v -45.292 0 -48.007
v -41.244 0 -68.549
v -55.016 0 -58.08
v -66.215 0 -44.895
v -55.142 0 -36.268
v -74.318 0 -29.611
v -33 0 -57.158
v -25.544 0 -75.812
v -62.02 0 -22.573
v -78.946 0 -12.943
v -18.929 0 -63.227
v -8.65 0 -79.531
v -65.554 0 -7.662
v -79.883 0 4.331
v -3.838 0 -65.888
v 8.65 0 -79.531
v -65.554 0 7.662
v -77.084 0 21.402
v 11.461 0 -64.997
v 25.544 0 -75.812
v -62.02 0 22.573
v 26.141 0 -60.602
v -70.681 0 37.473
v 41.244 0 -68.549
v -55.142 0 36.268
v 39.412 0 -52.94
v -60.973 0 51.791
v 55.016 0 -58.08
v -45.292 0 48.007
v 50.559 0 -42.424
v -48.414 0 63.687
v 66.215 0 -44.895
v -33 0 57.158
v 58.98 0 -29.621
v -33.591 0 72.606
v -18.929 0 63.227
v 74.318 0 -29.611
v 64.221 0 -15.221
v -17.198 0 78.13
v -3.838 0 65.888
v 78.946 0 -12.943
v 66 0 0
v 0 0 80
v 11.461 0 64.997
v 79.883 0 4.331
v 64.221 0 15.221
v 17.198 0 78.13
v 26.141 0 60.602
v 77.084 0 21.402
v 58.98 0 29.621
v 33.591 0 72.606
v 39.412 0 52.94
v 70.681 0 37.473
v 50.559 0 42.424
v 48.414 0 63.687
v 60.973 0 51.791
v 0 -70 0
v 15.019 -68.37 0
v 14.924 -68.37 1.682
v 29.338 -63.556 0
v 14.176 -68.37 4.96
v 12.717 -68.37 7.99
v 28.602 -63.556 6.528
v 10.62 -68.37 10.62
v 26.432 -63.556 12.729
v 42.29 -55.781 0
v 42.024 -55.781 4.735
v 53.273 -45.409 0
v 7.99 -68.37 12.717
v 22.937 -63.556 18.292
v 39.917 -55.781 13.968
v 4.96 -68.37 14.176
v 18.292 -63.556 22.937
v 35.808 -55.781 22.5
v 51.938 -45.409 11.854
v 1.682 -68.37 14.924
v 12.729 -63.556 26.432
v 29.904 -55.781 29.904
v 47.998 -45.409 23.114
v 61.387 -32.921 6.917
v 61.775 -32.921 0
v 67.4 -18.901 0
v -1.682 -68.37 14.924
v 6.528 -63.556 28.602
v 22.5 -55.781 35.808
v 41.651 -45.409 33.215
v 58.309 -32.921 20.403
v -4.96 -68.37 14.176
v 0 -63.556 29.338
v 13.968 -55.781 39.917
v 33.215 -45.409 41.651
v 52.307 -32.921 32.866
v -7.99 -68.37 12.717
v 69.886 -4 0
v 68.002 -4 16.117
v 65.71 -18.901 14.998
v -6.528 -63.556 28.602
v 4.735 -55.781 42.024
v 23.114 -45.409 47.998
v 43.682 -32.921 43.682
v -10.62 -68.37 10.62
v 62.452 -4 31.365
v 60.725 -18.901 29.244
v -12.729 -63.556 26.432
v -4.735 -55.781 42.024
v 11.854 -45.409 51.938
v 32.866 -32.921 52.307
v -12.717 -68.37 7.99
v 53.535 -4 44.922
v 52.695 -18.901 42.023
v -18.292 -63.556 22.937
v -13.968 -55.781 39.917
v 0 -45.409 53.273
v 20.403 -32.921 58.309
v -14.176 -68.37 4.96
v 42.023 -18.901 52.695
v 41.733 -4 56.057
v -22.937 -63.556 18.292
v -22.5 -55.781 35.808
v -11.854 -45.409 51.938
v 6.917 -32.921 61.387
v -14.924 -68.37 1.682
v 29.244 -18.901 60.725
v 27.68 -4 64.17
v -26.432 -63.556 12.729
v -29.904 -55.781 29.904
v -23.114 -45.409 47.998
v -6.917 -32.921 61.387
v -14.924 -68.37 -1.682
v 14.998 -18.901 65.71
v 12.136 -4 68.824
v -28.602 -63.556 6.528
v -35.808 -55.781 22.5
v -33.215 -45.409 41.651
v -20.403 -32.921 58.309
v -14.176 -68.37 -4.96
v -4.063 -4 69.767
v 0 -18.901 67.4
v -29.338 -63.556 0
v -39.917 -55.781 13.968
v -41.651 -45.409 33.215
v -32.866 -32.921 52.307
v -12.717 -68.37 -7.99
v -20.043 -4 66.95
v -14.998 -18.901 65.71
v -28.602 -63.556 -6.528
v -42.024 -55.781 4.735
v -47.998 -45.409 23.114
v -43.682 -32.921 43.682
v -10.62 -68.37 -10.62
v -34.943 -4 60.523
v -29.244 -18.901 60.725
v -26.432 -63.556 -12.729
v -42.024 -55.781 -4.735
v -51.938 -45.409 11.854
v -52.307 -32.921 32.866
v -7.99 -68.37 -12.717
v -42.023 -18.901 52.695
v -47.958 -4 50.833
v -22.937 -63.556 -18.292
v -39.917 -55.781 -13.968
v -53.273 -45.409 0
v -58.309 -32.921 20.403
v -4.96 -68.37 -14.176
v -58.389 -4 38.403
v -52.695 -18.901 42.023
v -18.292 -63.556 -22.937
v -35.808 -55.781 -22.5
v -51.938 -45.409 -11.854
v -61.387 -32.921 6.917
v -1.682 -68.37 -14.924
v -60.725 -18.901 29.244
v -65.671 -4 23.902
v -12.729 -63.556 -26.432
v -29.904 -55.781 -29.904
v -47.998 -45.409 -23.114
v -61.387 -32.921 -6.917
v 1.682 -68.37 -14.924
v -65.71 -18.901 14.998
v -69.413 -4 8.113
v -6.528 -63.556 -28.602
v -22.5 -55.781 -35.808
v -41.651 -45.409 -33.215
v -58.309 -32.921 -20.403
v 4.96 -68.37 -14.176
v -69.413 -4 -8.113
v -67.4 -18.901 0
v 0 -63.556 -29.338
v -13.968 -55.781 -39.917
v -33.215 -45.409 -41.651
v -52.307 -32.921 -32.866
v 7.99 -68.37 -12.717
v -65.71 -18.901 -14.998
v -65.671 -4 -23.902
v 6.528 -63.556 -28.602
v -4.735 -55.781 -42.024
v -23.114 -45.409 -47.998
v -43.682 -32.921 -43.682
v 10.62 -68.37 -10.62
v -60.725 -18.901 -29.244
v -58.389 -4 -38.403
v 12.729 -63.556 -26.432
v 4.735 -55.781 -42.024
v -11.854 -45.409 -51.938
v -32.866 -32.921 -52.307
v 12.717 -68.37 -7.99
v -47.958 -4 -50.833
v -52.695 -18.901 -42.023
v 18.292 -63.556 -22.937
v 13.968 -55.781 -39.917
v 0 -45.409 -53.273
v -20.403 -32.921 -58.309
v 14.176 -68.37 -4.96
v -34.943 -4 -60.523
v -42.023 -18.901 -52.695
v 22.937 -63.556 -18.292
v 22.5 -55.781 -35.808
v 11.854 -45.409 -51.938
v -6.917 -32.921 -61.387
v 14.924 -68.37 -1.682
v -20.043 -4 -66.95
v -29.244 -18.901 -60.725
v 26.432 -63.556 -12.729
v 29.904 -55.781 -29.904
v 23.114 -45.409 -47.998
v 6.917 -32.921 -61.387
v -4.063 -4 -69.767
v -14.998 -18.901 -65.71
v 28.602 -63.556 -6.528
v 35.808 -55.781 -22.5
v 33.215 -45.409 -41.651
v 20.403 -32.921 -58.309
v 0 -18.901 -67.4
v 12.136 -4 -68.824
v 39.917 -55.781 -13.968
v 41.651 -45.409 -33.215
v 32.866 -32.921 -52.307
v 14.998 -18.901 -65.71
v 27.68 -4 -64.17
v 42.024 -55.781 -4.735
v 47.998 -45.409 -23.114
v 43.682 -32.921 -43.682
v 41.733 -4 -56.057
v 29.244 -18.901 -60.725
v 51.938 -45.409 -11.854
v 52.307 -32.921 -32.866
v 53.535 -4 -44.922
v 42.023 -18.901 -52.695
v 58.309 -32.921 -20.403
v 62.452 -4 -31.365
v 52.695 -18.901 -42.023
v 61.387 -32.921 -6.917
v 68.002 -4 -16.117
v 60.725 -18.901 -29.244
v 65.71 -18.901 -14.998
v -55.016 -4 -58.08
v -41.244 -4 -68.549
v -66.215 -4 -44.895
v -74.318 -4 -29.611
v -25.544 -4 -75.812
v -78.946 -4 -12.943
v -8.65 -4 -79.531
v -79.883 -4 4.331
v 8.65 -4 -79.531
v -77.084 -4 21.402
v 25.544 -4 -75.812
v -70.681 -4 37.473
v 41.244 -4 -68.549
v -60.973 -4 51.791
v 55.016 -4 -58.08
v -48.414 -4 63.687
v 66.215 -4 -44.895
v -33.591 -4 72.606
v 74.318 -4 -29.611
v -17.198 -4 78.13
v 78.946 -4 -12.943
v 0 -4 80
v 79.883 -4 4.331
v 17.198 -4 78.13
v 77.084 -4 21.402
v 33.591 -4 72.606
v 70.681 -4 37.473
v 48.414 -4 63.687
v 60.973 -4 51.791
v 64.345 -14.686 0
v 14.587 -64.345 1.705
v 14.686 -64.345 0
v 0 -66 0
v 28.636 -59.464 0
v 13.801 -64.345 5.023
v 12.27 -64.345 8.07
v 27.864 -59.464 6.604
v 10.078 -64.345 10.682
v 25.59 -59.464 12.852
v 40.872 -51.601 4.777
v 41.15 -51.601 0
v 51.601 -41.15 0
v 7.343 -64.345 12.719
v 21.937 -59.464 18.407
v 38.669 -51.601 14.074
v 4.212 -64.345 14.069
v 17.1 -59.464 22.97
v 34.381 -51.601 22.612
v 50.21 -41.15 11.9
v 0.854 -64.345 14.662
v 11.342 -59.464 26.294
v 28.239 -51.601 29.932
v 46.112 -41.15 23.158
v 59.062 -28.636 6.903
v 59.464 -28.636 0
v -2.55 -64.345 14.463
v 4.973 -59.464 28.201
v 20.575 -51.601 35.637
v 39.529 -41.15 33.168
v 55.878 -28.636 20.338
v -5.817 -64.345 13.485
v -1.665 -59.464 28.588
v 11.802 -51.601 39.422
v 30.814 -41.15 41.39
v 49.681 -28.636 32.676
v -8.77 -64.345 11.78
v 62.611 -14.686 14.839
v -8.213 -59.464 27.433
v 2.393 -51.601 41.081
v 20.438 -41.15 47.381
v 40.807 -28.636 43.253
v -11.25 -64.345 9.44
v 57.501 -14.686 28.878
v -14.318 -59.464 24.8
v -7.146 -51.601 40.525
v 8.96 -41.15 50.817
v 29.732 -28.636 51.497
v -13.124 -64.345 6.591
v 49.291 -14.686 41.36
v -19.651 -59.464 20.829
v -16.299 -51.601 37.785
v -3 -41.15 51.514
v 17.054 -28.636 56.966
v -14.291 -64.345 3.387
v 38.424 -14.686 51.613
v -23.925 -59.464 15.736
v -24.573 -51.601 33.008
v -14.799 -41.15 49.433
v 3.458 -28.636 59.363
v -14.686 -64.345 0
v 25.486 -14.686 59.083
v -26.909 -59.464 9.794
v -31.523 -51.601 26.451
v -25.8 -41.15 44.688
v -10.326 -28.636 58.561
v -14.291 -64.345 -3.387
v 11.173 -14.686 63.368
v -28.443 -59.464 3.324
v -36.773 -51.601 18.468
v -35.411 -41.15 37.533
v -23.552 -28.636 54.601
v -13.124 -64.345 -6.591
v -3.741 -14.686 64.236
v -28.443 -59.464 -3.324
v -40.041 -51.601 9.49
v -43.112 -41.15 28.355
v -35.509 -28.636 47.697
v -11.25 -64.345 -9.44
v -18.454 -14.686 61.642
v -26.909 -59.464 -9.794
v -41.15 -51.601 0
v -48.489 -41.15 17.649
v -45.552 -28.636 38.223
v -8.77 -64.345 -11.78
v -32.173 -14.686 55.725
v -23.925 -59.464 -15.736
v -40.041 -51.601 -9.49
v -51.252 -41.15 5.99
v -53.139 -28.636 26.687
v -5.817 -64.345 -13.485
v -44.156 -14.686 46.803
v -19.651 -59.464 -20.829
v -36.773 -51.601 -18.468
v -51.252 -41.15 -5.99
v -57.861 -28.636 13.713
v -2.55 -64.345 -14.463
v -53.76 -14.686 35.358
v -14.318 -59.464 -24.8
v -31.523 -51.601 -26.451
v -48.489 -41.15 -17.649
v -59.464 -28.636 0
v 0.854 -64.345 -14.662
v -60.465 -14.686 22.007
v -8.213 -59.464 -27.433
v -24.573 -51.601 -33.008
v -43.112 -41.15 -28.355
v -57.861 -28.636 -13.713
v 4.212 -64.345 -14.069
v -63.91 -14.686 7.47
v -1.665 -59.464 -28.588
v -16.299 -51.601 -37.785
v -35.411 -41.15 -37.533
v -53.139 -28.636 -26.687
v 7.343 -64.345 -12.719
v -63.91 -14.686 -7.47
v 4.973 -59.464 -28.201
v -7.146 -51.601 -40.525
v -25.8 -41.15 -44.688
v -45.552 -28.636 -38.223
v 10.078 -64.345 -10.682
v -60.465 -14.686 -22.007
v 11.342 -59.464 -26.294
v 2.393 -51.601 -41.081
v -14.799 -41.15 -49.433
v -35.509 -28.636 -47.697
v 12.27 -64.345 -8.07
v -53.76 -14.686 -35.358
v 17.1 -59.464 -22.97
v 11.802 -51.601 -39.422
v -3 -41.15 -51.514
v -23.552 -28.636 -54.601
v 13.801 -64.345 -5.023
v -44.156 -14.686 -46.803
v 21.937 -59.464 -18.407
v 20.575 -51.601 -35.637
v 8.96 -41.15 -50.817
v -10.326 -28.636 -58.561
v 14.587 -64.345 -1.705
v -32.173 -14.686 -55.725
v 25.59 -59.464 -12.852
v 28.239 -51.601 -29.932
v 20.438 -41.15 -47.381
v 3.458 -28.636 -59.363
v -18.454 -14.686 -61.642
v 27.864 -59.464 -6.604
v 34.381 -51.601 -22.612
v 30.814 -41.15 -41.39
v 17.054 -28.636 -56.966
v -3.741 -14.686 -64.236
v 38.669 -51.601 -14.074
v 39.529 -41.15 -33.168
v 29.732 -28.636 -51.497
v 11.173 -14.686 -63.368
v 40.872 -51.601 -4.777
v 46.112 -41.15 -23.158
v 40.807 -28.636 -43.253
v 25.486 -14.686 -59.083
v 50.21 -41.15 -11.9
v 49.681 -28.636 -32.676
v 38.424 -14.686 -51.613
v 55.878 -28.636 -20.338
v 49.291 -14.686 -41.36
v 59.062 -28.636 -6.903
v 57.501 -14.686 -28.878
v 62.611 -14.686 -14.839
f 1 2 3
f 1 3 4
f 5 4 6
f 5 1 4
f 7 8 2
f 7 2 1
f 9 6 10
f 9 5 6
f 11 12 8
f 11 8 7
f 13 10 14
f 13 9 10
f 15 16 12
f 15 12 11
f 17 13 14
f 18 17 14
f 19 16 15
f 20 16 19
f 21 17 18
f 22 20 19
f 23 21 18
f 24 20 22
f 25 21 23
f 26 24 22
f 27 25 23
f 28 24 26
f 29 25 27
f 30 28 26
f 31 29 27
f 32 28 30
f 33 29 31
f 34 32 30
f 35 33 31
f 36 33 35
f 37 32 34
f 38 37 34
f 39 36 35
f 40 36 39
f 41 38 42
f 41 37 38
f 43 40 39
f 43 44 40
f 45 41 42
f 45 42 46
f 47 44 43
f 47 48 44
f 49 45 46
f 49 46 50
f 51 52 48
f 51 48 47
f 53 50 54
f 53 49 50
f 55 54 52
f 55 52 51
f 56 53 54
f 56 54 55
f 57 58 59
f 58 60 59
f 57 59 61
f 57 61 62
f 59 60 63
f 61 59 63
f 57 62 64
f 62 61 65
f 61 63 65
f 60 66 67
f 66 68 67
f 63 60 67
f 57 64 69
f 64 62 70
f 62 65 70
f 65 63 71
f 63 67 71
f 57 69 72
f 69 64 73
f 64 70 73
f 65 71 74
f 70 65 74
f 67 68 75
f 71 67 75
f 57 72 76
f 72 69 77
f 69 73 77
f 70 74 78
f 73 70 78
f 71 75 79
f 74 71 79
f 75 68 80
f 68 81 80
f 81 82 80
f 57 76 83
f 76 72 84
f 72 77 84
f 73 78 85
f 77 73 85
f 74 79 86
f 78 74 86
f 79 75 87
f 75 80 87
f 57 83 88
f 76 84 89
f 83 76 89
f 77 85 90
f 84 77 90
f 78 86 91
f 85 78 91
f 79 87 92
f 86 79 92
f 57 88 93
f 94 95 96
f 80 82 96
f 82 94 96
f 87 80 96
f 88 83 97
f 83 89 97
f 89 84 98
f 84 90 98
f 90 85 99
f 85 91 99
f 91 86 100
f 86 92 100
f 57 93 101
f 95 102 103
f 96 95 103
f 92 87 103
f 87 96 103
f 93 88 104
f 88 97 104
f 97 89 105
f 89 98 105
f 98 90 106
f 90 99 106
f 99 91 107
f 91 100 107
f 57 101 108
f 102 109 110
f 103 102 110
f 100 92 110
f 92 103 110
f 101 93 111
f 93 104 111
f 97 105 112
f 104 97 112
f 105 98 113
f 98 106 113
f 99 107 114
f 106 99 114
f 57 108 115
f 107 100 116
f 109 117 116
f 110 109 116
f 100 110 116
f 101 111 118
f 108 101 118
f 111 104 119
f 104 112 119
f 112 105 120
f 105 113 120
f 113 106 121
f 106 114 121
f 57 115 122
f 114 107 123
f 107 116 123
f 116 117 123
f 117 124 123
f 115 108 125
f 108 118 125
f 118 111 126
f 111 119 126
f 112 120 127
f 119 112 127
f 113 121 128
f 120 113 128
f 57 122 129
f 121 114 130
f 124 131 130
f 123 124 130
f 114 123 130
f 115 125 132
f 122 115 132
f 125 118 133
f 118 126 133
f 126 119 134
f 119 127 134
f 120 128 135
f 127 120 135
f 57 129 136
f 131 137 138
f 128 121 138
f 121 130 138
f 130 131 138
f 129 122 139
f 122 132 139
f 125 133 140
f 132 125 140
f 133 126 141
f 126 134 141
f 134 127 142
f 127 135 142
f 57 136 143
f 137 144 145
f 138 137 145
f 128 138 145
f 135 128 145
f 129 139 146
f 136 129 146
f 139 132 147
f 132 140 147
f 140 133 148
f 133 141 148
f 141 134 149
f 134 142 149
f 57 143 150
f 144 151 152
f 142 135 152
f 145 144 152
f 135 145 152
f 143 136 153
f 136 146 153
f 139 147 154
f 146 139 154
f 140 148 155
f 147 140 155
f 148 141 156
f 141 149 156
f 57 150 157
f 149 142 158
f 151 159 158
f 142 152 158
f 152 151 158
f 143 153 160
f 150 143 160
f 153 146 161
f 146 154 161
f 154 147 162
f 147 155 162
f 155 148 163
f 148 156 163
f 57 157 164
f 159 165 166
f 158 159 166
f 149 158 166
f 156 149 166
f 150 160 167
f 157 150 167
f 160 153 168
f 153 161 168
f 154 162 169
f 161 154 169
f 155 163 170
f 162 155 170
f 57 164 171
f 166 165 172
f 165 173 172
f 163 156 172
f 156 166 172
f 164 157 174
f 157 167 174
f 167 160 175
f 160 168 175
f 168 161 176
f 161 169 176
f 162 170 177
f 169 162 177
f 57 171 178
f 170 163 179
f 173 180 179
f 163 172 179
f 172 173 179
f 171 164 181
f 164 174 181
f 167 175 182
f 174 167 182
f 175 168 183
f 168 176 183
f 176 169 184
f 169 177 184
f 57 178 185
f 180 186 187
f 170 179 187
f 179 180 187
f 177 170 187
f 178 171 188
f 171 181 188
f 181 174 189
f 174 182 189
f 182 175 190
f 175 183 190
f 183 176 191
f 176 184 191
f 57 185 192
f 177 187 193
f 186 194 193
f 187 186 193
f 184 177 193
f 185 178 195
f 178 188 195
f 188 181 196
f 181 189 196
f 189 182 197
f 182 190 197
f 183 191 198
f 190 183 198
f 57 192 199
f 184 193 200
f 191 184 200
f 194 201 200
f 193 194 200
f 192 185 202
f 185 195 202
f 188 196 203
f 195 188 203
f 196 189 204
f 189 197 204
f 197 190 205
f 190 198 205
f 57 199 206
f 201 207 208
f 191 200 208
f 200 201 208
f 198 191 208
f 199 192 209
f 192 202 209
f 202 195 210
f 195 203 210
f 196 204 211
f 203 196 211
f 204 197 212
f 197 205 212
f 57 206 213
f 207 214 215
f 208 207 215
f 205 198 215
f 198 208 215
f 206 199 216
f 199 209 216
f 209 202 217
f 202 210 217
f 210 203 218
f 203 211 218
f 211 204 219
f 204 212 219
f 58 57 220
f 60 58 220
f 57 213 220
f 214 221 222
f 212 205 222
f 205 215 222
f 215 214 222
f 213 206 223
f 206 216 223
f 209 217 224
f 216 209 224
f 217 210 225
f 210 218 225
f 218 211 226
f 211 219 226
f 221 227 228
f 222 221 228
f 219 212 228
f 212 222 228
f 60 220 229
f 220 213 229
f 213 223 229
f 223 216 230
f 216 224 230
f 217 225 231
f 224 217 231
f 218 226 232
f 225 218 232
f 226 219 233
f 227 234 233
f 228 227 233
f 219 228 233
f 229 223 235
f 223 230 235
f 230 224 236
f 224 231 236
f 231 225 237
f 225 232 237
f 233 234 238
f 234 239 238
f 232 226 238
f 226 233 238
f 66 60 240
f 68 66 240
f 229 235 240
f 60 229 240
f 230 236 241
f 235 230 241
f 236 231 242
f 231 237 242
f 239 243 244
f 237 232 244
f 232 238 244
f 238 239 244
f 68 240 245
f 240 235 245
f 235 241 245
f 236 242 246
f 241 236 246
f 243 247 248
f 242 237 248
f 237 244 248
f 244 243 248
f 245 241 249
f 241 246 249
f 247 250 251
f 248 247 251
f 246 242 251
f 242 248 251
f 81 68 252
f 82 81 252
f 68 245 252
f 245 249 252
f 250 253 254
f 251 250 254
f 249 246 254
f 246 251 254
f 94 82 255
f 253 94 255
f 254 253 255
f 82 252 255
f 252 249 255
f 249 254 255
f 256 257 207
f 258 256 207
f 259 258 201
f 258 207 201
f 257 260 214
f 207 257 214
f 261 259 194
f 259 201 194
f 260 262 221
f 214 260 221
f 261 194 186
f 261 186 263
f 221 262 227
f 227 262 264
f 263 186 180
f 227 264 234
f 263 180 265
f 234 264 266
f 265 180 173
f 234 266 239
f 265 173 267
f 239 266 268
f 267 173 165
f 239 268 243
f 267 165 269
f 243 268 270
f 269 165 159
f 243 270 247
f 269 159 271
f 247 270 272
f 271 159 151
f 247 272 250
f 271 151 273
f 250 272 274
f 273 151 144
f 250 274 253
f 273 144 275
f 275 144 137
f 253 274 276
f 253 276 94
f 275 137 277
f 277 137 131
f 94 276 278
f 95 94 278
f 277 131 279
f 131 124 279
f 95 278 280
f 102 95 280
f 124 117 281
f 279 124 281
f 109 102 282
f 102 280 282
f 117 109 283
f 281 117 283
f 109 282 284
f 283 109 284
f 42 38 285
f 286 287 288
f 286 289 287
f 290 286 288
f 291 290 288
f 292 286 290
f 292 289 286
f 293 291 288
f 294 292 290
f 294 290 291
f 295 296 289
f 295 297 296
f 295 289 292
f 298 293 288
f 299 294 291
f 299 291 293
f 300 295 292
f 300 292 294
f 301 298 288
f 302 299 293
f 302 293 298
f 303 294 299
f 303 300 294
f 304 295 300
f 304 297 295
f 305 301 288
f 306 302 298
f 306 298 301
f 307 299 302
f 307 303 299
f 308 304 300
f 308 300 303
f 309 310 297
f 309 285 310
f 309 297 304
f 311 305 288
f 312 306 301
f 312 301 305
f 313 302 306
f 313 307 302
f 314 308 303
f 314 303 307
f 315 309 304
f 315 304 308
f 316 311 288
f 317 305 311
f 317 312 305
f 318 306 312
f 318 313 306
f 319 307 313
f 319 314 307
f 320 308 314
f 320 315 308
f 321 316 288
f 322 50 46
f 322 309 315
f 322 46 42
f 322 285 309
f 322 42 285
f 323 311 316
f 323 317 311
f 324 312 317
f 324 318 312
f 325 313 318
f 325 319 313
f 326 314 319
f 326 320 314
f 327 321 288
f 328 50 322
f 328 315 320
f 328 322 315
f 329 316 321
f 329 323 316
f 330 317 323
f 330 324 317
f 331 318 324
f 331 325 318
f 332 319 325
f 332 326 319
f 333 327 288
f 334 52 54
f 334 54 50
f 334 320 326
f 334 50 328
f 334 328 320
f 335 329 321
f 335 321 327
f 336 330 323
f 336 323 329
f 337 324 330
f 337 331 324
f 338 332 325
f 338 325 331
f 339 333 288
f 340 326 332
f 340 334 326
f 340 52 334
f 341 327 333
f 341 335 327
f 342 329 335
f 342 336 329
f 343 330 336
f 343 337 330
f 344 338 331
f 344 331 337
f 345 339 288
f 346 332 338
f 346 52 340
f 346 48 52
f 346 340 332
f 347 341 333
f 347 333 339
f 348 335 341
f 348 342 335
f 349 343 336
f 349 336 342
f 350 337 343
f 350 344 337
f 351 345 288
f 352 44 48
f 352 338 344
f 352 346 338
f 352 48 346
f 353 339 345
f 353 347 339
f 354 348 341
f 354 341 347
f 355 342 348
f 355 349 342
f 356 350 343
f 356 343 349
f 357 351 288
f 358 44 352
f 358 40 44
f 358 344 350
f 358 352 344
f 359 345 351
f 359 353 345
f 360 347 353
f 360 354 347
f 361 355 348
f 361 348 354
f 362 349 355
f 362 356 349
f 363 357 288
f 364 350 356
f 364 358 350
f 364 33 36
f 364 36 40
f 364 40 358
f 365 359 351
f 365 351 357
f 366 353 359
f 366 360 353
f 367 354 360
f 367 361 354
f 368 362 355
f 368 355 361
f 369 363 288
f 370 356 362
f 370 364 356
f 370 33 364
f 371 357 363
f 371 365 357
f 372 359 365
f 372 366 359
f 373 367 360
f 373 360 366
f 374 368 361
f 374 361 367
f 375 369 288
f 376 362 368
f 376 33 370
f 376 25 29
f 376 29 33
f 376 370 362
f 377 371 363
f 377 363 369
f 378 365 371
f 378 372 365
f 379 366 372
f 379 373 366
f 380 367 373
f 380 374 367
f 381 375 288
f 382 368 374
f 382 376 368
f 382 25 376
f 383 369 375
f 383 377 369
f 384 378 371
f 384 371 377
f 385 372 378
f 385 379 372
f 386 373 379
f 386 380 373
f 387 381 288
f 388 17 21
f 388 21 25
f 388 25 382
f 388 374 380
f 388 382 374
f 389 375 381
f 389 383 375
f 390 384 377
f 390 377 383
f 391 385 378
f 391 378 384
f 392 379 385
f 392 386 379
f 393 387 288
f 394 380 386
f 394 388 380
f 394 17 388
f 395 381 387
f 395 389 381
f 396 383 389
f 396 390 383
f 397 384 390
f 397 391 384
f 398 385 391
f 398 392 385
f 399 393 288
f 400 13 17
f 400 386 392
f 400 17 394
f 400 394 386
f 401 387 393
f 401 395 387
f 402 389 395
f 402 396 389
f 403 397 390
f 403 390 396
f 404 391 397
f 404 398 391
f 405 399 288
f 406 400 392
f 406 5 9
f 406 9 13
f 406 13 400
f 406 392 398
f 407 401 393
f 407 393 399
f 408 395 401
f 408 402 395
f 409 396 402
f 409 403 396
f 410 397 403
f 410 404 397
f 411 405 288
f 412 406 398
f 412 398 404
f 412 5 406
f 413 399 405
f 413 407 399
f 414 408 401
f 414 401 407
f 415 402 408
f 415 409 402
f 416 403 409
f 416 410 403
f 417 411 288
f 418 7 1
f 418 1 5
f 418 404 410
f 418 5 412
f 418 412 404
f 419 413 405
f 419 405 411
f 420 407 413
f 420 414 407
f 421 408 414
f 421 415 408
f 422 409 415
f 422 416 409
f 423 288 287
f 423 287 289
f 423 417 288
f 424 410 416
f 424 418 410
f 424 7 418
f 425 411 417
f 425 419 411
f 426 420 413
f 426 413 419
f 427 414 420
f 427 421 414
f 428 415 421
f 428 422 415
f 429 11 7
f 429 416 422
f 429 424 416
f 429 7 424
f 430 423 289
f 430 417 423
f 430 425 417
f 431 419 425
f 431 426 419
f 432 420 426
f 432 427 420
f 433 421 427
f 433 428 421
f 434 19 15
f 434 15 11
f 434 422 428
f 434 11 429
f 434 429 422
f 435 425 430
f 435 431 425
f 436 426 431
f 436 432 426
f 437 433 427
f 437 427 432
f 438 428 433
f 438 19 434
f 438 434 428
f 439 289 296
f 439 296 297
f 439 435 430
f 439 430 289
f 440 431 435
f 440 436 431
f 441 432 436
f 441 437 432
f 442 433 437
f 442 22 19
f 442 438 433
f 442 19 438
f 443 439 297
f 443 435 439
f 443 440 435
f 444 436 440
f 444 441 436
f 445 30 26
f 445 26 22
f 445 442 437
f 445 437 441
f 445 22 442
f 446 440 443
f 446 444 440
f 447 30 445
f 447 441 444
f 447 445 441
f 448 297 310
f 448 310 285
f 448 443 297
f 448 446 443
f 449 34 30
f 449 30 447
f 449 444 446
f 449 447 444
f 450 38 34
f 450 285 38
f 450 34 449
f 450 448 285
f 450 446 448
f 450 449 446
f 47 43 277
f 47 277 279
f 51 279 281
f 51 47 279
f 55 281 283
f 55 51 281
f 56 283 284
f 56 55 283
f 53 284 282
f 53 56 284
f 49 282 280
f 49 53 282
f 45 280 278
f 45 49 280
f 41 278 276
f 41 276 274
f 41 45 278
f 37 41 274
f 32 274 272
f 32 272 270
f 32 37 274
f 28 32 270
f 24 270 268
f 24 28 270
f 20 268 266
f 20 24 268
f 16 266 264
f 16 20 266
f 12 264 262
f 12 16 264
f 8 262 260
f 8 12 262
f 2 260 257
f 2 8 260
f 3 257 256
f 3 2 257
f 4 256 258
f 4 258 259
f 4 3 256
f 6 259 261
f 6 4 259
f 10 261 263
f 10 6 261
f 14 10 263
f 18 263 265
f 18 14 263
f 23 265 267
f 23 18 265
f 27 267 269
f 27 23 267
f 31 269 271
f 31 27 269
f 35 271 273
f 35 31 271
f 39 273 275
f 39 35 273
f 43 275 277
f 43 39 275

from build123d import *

# Parameters (mm, degrees)
SKETCH_2_W          = 150
SKETCH_2_H          = 150
CUT_EXTRUDE_1_DEPTH = 70
SHELL_1_T           = -4
SKETCH_3_R          = 80
SKETCH_3_R_2        = 66
EXTRUDE_1_DEPTH     = 4


with BuildPart() as part:
    # 草图1 → 旋转1 (revolve)
    with BuildSketch(Plane.XY):
        with BuildLine():
            Line((0, 70), (0, -70))
            ThreePointArc((0, -70), (70, 0), (0, 70))
        make_face()
    revolve(axis=Axis((0, 70, 0), (0, -1, 0)))

    # 草图2 → 切除-拉伸1 (cut)
    with BuildSketch(Plane(origin=(0, 0, 0), x_dir=(1, 0, 0), z_dir=(0, 1, 0))):
        Rectangle(SKETCH_2_W, SKETCH_2_H)
    extrude(amount=CUT_EXTRUDE_1_DEPTH, mode=Mode.SUBTRACT)

    # 抽壳1
    shell_1_openings = [part.faces().sort_by_distance(p)[0] for p in [
        (0, 0, 0),
    ]]
    offset(amount=SHELL_1_T, openings=shell_1_openings, kind=Kind.INTERSECTION)

    # 草图3 → 凸台-拉伸1 (add)
    with BuildSketch(Plane(origin=(0, 0, 0), x_dir=(1, 0, 0), z_dir=(0, 1, 0))):
        with Locations(Location((0, 0, 0), (0, 0, 270))):
            Circle(SKETCH_3_R)
        Circle(SKETCH_3_R_2, mode=Mode.SUBTRACT)
    extrude(amount=-EXTRUDE_1_DEPTH)


solid = part.part
